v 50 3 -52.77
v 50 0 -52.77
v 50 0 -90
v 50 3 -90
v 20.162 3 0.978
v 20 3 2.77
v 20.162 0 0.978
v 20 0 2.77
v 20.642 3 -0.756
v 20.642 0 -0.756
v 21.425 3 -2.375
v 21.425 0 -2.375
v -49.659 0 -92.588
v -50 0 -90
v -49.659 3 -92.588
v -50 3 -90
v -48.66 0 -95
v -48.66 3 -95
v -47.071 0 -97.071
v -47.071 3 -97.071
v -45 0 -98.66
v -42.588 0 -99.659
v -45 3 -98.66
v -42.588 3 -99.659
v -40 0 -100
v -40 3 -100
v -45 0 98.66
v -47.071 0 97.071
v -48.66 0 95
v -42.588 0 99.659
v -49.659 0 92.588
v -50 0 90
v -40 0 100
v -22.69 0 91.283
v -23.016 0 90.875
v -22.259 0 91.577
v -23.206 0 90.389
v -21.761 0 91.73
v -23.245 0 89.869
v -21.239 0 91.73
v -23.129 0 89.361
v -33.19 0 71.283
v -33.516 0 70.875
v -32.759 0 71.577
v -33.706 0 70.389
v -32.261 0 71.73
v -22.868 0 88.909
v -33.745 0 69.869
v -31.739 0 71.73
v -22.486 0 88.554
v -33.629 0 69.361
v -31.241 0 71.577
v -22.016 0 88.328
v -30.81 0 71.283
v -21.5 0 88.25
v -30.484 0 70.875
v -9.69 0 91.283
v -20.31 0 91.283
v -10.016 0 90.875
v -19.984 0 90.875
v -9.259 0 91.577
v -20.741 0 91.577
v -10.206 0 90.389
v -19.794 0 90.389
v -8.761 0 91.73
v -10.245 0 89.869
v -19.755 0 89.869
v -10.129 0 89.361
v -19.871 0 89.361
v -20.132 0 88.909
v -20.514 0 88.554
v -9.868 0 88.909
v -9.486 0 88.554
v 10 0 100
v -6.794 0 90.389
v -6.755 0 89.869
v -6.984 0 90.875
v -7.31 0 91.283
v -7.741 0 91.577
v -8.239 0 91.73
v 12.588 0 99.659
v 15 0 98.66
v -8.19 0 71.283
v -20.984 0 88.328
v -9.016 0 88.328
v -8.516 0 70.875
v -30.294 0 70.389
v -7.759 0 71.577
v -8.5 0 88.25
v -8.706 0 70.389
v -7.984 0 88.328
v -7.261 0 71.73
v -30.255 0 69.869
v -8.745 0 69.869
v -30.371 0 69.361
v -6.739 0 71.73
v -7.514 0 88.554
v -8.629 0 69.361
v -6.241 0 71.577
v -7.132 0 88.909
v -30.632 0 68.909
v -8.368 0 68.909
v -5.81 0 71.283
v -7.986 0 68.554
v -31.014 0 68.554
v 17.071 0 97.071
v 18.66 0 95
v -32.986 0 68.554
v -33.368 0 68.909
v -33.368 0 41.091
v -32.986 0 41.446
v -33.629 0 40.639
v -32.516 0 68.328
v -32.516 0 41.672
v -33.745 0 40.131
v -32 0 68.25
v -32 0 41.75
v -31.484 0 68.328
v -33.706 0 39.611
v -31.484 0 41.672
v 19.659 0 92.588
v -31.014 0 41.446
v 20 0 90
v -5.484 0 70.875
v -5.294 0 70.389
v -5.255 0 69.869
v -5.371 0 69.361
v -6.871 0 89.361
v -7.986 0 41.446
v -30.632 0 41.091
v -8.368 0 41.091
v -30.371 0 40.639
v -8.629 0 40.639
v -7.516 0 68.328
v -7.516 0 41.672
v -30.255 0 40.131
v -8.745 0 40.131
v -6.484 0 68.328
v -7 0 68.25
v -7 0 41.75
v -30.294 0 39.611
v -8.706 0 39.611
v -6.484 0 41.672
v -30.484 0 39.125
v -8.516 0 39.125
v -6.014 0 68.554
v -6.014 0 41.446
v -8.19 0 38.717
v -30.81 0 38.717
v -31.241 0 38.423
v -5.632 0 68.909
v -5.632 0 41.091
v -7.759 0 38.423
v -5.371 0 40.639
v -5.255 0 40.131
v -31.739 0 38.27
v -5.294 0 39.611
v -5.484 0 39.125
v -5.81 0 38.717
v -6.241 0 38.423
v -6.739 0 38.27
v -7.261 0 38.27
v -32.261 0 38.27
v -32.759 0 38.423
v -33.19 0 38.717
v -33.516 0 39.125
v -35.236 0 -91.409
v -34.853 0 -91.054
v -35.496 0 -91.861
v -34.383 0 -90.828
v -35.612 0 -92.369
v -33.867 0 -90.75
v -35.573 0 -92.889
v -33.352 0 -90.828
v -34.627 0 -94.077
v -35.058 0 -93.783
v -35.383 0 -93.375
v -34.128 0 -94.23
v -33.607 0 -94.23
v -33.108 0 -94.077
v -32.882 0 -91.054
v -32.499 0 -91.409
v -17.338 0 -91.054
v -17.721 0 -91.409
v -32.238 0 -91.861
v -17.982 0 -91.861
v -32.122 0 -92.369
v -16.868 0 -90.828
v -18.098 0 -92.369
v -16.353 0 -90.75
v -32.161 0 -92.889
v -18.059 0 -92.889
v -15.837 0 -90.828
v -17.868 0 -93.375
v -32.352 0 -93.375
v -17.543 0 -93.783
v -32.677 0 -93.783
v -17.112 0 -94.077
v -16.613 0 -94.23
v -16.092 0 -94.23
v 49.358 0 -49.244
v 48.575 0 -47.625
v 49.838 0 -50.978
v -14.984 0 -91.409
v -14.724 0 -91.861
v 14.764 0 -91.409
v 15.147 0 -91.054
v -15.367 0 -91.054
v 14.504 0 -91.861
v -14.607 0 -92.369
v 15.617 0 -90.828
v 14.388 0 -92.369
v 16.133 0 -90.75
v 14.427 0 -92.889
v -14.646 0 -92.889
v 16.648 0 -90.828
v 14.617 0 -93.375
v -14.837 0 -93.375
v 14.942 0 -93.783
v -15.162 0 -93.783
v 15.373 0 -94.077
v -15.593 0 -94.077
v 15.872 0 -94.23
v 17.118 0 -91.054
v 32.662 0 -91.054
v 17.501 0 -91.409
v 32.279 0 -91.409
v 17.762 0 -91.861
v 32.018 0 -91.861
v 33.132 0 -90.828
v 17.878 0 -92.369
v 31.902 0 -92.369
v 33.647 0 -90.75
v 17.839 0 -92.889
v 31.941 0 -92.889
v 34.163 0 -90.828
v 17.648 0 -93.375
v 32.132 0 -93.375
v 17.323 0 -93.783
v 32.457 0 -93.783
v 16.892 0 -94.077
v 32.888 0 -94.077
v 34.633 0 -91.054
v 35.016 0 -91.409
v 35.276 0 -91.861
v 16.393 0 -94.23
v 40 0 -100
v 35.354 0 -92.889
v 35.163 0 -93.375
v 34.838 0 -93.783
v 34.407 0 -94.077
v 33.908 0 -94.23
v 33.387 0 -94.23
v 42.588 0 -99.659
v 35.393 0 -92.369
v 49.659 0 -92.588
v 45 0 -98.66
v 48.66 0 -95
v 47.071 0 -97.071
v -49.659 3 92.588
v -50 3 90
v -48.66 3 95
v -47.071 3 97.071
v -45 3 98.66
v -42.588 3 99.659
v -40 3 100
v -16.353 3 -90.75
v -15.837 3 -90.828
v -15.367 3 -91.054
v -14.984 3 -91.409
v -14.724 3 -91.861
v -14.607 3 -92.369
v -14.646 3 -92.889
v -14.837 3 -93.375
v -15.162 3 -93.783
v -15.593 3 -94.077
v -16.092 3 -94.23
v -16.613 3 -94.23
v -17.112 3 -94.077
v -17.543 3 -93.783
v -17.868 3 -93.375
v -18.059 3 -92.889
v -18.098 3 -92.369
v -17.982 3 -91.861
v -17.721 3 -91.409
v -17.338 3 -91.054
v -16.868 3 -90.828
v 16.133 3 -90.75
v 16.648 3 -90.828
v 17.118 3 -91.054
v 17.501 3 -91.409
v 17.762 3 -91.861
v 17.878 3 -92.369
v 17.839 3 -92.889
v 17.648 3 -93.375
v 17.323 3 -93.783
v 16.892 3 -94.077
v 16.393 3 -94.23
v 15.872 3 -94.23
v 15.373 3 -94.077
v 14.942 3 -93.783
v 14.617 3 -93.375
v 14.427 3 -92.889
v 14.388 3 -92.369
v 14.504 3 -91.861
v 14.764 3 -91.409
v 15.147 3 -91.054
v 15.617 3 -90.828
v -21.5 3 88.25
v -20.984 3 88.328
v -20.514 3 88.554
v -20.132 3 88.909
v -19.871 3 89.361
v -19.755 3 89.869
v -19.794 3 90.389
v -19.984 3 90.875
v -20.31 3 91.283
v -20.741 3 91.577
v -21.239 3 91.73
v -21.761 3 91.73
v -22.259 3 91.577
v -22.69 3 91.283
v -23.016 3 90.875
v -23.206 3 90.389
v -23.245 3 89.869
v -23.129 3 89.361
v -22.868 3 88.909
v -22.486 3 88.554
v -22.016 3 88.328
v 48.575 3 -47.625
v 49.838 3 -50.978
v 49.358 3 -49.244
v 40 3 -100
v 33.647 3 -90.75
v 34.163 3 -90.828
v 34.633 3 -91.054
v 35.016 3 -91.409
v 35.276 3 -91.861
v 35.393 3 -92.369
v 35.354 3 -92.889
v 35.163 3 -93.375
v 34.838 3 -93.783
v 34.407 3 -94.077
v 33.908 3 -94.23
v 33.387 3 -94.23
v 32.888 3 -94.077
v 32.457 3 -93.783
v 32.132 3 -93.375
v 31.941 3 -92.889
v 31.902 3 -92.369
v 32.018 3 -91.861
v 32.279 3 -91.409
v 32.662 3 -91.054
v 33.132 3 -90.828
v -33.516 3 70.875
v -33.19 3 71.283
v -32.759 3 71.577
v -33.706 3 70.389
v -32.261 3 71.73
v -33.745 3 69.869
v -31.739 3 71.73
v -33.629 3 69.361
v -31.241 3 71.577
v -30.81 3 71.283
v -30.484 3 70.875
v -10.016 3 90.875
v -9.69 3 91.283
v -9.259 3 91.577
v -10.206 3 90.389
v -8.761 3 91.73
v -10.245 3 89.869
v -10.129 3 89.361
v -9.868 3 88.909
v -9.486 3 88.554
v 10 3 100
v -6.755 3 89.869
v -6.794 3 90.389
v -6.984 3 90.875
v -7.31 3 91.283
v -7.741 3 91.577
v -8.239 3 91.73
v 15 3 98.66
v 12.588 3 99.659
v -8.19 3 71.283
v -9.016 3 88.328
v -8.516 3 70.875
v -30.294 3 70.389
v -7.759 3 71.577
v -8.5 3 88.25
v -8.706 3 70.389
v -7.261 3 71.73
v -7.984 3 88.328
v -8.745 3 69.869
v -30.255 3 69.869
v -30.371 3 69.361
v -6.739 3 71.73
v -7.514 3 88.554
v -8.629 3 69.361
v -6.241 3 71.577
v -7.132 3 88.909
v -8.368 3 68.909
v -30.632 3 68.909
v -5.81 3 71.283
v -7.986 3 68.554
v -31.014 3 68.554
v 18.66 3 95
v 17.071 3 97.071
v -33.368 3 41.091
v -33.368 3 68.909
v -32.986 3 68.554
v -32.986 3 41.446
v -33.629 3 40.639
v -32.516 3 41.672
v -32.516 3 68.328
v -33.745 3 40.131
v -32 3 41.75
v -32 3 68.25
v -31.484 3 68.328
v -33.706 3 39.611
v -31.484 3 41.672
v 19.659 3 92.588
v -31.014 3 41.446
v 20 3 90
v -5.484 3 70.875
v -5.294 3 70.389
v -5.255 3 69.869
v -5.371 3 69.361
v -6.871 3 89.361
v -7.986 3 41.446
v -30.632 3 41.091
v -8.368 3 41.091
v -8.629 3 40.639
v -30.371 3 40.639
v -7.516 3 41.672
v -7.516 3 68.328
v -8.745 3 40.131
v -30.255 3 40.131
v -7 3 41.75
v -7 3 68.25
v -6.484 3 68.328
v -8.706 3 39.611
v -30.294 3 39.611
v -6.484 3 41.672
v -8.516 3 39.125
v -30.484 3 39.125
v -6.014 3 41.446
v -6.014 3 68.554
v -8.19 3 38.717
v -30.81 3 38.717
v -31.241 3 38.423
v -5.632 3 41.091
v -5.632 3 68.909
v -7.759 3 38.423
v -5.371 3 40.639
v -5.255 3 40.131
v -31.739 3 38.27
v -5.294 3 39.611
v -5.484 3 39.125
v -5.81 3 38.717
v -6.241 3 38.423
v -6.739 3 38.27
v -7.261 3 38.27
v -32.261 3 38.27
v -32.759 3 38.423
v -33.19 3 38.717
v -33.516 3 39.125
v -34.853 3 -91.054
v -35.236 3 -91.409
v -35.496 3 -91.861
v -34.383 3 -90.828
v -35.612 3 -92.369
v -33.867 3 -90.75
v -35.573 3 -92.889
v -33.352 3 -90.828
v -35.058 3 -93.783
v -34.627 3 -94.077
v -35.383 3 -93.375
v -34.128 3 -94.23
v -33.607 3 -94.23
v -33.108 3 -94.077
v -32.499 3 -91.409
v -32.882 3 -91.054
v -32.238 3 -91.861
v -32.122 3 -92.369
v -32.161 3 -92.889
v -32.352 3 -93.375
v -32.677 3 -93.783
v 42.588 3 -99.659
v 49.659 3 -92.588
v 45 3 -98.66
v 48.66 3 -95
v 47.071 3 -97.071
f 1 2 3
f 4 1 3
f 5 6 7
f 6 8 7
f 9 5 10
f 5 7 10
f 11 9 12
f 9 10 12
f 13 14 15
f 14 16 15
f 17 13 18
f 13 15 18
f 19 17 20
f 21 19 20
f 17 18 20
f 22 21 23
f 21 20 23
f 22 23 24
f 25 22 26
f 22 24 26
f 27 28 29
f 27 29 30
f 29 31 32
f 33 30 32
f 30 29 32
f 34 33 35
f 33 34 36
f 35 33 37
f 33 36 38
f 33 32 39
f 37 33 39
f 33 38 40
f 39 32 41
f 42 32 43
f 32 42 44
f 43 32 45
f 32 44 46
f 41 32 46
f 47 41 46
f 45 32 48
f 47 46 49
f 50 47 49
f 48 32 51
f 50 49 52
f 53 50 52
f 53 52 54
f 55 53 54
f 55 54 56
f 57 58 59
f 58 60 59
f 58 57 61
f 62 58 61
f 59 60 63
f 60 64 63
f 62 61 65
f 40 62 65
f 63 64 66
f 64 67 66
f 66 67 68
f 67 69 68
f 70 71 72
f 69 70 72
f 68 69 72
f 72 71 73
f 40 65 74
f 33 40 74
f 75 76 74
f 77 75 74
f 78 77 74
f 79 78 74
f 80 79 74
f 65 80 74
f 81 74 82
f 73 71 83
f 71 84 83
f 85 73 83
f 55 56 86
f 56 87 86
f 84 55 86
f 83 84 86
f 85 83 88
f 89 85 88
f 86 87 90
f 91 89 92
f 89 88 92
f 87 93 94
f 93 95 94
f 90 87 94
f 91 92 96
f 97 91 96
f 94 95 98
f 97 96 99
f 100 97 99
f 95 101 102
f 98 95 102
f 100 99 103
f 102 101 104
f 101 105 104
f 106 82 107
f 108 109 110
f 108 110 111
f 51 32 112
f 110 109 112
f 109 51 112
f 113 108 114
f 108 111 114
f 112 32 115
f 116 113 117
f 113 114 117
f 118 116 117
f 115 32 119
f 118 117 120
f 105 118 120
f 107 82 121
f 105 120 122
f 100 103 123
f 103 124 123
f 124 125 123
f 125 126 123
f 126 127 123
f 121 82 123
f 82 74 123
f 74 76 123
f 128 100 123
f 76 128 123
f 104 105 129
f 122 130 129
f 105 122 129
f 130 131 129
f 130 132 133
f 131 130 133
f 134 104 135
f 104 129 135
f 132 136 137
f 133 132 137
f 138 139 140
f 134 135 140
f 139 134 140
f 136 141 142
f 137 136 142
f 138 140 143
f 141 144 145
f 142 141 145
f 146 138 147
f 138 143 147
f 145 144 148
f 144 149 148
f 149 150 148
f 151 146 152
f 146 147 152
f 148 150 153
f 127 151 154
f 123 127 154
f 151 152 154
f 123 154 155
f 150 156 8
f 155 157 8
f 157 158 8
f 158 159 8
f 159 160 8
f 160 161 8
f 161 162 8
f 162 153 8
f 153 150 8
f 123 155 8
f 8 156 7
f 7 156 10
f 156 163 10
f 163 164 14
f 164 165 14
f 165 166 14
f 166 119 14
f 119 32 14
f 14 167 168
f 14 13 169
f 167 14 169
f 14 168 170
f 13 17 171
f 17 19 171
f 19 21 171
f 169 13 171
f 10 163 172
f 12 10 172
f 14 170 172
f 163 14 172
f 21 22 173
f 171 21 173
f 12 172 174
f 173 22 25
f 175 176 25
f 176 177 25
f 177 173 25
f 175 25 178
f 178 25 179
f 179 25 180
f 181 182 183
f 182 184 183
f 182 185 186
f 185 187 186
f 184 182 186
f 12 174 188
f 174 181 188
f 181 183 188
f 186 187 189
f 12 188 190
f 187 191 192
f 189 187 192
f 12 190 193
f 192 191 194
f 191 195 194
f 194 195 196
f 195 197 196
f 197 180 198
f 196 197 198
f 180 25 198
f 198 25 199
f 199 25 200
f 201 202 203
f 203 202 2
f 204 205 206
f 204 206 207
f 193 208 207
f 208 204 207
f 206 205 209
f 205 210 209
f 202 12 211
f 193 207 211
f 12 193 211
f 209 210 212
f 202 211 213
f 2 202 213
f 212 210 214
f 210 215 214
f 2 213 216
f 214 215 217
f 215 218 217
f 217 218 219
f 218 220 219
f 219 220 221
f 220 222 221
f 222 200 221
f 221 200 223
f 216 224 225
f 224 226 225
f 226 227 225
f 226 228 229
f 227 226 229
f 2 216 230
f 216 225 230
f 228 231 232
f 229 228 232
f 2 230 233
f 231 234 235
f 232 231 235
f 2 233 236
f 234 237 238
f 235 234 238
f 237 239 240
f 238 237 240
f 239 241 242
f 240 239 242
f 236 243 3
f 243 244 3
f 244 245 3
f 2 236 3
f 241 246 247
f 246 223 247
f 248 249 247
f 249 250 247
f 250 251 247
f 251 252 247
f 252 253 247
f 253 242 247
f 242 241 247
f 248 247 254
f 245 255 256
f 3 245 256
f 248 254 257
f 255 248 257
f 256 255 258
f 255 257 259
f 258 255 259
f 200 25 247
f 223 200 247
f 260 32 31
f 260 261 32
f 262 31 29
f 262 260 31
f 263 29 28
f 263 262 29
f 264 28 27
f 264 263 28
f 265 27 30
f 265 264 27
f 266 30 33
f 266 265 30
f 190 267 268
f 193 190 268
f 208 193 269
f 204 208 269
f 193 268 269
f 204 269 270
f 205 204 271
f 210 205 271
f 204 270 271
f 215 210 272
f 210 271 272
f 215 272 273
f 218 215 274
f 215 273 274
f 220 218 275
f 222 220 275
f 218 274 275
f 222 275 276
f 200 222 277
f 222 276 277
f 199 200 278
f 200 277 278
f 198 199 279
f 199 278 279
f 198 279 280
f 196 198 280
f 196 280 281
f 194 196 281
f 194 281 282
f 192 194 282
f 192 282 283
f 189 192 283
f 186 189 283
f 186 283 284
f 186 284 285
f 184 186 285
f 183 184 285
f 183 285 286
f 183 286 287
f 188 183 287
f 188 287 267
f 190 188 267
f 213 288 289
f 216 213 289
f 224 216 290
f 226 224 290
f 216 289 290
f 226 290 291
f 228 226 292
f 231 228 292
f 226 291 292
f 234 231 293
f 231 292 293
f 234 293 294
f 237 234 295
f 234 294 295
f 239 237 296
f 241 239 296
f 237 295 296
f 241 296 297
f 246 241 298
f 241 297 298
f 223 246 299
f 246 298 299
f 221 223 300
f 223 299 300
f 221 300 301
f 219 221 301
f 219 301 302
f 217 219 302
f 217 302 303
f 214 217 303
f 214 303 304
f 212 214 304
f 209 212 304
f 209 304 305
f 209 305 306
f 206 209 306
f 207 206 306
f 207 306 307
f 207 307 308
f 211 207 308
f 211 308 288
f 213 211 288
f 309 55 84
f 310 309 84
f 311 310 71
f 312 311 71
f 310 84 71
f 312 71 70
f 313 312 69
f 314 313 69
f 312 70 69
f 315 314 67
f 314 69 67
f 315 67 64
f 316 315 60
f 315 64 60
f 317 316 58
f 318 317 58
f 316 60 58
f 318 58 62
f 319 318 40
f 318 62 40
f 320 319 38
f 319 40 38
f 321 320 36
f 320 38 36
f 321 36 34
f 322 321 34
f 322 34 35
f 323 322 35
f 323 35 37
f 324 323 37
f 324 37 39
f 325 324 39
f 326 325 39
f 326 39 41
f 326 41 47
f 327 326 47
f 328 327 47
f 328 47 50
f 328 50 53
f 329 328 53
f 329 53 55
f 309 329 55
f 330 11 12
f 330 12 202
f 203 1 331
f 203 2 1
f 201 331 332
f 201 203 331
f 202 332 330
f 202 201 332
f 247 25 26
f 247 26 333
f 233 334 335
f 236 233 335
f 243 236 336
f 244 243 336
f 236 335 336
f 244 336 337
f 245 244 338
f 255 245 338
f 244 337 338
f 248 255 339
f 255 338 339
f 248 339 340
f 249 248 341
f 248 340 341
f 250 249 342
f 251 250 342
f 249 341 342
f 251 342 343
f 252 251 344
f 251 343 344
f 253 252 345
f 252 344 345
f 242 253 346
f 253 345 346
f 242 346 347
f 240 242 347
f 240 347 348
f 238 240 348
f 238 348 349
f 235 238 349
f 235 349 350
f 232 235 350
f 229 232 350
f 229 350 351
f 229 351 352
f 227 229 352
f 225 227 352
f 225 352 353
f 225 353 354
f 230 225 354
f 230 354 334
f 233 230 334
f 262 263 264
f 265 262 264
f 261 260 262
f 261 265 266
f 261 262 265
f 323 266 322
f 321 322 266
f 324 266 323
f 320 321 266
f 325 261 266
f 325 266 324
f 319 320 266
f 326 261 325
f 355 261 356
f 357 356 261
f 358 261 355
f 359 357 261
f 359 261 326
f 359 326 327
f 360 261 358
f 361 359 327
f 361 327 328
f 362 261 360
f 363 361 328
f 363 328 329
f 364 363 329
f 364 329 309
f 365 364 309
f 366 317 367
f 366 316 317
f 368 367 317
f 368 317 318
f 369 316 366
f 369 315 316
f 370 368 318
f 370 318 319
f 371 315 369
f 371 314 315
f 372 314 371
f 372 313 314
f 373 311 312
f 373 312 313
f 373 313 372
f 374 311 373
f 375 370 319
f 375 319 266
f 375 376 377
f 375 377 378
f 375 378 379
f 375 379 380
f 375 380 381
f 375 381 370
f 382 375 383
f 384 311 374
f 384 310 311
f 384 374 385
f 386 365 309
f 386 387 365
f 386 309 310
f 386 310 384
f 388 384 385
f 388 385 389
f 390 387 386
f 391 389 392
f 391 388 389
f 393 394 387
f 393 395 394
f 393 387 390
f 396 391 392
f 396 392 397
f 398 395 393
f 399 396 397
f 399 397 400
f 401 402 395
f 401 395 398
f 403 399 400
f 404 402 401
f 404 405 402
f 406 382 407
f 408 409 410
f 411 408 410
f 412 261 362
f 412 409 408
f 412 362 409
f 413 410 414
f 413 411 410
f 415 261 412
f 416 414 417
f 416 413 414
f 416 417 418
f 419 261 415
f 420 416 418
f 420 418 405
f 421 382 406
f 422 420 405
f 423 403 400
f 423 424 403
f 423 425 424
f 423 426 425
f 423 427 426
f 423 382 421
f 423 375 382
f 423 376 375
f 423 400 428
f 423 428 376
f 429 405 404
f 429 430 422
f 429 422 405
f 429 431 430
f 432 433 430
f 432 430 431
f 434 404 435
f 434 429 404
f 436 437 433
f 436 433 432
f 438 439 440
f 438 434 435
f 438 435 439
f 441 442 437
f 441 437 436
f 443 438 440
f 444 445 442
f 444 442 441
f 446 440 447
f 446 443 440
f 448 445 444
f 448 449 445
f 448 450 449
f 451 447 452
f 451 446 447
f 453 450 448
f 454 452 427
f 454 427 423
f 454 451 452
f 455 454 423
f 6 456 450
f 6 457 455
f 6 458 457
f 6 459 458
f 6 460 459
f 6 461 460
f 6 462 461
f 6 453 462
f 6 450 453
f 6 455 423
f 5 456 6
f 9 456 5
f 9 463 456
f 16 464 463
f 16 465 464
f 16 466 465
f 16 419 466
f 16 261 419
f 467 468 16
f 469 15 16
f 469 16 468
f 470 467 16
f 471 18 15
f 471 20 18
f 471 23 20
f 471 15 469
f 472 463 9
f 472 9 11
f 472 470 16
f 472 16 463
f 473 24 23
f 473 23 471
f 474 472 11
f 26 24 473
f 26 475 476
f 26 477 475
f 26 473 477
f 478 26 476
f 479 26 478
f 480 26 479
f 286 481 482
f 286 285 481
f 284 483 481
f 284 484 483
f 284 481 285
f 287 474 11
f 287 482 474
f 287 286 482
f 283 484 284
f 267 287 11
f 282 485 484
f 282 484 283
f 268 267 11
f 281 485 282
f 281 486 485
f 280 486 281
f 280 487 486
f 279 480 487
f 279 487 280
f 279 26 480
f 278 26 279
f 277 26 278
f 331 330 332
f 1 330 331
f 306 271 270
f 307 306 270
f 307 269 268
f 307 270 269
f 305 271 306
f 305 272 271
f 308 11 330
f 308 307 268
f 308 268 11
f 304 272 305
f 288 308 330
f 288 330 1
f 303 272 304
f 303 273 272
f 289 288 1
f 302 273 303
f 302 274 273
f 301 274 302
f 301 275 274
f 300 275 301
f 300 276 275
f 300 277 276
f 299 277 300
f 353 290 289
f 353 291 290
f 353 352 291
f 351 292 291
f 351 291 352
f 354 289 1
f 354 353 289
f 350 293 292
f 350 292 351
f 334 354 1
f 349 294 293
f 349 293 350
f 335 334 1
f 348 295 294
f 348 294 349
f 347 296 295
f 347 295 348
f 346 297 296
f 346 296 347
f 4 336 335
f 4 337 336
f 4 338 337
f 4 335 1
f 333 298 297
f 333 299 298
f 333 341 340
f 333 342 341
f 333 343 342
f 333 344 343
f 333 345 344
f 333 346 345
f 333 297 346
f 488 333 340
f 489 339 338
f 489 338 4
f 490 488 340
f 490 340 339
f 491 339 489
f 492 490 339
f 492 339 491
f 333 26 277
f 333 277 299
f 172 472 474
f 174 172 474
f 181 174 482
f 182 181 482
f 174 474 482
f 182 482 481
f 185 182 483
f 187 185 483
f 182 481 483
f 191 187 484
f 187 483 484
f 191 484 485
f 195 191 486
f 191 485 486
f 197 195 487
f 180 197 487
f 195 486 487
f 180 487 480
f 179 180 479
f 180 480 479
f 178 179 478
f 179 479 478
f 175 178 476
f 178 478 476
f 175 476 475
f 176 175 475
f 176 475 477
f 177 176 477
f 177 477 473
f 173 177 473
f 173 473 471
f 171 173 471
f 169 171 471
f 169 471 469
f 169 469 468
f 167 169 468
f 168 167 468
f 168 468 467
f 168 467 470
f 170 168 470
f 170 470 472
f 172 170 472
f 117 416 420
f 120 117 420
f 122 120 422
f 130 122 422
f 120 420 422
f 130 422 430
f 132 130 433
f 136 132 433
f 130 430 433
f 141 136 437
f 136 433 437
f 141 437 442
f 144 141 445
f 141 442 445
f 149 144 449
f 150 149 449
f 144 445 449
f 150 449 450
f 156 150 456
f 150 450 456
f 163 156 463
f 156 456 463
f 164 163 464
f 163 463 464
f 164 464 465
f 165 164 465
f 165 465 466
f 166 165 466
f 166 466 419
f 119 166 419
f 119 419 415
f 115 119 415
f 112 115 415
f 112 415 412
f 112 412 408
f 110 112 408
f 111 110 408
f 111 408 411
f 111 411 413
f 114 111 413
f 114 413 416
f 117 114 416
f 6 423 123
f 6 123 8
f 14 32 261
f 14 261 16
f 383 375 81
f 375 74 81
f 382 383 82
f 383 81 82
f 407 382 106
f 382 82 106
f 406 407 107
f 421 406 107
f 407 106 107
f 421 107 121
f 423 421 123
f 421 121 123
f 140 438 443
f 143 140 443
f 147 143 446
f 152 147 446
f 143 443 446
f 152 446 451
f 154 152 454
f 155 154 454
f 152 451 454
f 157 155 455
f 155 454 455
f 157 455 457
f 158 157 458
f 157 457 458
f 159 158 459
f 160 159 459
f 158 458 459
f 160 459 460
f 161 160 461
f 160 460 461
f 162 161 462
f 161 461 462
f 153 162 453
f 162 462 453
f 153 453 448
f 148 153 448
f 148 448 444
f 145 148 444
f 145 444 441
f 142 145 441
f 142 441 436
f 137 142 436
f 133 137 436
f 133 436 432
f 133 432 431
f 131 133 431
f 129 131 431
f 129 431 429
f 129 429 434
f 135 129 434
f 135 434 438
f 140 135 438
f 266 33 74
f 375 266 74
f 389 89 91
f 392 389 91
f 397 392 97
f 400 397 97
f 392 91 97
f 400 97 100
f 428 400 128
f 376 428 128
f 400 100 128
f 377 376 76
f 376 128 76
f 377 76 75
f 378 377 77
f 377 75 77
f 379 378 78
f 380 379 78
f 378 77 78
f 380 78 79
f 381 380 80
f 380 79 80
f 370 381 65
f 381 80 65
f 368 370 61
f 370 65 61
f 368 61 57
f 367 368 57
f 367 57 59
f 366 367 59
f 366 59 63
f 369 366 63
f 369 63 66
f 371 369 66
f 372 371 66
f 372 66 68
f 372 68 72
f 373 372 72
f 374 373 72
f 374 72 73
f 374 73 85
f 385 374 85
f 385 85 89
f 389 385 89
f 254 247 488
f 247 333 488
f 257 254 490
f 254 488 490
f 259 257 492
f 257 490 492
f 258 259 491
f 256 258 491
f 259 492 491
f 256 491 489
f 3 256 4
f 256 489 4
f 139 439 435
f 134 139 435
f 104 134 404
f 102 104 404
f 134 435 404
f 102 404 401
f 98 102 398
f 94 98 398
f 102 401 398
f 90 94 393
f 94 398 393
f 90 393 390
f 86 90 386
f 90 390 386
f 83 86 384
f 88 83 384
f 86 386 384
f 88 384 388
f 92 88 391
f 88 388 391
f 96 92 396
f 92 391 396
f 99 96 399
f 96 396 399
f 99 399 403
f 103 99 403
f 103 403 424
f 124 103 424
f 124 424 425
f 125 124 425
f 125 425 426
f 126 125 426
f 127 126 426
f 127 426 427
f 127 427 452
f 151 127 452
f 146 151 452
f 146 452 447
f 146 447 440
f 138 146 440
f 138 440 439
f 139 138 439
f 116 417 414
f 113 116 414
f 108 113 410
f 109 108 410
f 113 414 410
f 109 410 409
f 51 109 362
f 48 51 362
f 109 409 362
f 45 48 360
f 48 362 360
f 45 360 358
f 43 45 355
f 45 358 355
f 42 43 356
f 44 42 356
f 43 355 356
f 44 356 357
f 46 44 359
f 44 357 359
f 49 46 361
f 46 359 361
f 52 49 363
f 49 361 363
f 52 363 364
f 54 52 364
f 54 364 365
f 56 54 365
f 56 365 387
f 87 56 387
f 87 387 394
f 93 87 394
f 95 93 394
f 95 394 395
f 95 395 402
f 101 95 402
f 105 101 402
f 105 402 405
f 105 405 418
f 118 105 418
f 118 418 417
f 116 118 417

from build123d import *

# Parameters (mm, degrees)
SKETCH_1_W          = 100
SKETCH_1_H          = 200
EXTRUDE_1_DEPTH     = 3
CUT_EXTRUDE_1_DEPTH = 10
FILLET_2_R          = 10
SKETCH_4_R          = 1.75
CUT_EXTRUDE_2_DEPTH = 21
SKETCH_5_R          = 1.75
CUT_EXTRUDE_3_DEPTH = 4
SKETCH_7_R          = 1.75
CUT_EXTRUDE_4_DEPTH = 4


with BuildPart() as part:
    # 草图1 → 凸台-拉伸1 (new body)
    with BuildSketch(Plane(origin=(0, 0, 0), x_dir=(1, 0, 0), z_dir=(0, 1, 0))):
        Rectangle(SKETCH_1_W, SKETCH_1_H)
    extrude(amount=EXTRUDE_1_DEPTH)

    # 草图3 → 切除-拉伸1 (cut)
    with BuildSketch(Plane(origin=(0, 3, 0), x_dir=(1, 0, 0), z_dir=(0, 1, 0))):
        Polygon((20, -100), (20, 0), (50, 50), (50, -100), align=None)
    extrude(amount=-CUT_EXTRUDE_1_DEPTH, mode=Mode.SUBTRACT)

    # 圆角2
    fillet_2_edges = [part.edges().sort_by_distance(p)[0] for p in [
        (20, 1.5, 100),
        (20, 1.5, 0),
        (50, 1.5, -50),
        (-50, 1.5, 100),
        (-50, 1.5, -100),
        (50, 1.5, -100),
    ]]
    fillet(fillet_2_edges, radius=FILLET_2_R)

    # 草图4 → 切除-拉伸2 (cut)
    with BuildSketch(Plane(origin=(0, 3, 0), x_dir=(1, 0, 0), z_dir=(0, 1, 0))):
        with Locations(Location((33.647397187, 92.5, 0), (0, 0, 270))):
            Circle(SKETCH_4_R)
        with Locations(Location((16.132669012, 92.5, 0), (0, 0, 270))):
            Circle(SKETCH_4_R)
        with Locations(Location((-33.867330988, 92.5, 0), (0, 0, 270))):
            Circle(SKETCH_4_R)
        with Locations(Location((-16.352602813, 92.5, 0), (0, 0, 270))):
            Circle(SKETCH_4_R)
    extrude(amount=-CUT_EXTRUDE_2_DEPTH, mode=Mode.SUBTRACT)

    # 草图5 → 切除-拉伸3 (cut)
    with BuildSketch(Plane.XZ):
        with Locations(Location((-8.5, 90, 0), (0, 0, 270))):
            Circle(SKETCH_5_R)
        with Locations(Location((-21.5, 90, 0), (0, 0, 270))):
            Circle(SKETCH_5_R)
    extrude(amount=-CUT_EXTRUDE_3_DEPTH, mode=Mode.SUBTRACT)

    # 草图7 → 切除-拉伸4 (cut)
    with BuildSketch(Plane(origin=(0, 3, 0), x_dir=(1, 0, 0), z_dir=(0, 1, 0))):
        with Locations(Location((-32, -40, 0), (0, 0, 270))):
            Circle(SKETCH_7_R)
        with Locations(Location((-7, -40, 0), (0, 0, 270))):
            Circle(SKETCH_7_R)
        with Locations(Location((-7, -70, 0), (0, 0, 90))):
            Circle(SKETCH_7_R)
        with Locations(Location((-32, -70, 0), (0, 0, 90))):
            Circle(SKETCH_7_R)
    extrude(amount=-CUT_EXTRUDE_4_DEPTH, mode=Mode.SUBTRACT)


solid = part.part
